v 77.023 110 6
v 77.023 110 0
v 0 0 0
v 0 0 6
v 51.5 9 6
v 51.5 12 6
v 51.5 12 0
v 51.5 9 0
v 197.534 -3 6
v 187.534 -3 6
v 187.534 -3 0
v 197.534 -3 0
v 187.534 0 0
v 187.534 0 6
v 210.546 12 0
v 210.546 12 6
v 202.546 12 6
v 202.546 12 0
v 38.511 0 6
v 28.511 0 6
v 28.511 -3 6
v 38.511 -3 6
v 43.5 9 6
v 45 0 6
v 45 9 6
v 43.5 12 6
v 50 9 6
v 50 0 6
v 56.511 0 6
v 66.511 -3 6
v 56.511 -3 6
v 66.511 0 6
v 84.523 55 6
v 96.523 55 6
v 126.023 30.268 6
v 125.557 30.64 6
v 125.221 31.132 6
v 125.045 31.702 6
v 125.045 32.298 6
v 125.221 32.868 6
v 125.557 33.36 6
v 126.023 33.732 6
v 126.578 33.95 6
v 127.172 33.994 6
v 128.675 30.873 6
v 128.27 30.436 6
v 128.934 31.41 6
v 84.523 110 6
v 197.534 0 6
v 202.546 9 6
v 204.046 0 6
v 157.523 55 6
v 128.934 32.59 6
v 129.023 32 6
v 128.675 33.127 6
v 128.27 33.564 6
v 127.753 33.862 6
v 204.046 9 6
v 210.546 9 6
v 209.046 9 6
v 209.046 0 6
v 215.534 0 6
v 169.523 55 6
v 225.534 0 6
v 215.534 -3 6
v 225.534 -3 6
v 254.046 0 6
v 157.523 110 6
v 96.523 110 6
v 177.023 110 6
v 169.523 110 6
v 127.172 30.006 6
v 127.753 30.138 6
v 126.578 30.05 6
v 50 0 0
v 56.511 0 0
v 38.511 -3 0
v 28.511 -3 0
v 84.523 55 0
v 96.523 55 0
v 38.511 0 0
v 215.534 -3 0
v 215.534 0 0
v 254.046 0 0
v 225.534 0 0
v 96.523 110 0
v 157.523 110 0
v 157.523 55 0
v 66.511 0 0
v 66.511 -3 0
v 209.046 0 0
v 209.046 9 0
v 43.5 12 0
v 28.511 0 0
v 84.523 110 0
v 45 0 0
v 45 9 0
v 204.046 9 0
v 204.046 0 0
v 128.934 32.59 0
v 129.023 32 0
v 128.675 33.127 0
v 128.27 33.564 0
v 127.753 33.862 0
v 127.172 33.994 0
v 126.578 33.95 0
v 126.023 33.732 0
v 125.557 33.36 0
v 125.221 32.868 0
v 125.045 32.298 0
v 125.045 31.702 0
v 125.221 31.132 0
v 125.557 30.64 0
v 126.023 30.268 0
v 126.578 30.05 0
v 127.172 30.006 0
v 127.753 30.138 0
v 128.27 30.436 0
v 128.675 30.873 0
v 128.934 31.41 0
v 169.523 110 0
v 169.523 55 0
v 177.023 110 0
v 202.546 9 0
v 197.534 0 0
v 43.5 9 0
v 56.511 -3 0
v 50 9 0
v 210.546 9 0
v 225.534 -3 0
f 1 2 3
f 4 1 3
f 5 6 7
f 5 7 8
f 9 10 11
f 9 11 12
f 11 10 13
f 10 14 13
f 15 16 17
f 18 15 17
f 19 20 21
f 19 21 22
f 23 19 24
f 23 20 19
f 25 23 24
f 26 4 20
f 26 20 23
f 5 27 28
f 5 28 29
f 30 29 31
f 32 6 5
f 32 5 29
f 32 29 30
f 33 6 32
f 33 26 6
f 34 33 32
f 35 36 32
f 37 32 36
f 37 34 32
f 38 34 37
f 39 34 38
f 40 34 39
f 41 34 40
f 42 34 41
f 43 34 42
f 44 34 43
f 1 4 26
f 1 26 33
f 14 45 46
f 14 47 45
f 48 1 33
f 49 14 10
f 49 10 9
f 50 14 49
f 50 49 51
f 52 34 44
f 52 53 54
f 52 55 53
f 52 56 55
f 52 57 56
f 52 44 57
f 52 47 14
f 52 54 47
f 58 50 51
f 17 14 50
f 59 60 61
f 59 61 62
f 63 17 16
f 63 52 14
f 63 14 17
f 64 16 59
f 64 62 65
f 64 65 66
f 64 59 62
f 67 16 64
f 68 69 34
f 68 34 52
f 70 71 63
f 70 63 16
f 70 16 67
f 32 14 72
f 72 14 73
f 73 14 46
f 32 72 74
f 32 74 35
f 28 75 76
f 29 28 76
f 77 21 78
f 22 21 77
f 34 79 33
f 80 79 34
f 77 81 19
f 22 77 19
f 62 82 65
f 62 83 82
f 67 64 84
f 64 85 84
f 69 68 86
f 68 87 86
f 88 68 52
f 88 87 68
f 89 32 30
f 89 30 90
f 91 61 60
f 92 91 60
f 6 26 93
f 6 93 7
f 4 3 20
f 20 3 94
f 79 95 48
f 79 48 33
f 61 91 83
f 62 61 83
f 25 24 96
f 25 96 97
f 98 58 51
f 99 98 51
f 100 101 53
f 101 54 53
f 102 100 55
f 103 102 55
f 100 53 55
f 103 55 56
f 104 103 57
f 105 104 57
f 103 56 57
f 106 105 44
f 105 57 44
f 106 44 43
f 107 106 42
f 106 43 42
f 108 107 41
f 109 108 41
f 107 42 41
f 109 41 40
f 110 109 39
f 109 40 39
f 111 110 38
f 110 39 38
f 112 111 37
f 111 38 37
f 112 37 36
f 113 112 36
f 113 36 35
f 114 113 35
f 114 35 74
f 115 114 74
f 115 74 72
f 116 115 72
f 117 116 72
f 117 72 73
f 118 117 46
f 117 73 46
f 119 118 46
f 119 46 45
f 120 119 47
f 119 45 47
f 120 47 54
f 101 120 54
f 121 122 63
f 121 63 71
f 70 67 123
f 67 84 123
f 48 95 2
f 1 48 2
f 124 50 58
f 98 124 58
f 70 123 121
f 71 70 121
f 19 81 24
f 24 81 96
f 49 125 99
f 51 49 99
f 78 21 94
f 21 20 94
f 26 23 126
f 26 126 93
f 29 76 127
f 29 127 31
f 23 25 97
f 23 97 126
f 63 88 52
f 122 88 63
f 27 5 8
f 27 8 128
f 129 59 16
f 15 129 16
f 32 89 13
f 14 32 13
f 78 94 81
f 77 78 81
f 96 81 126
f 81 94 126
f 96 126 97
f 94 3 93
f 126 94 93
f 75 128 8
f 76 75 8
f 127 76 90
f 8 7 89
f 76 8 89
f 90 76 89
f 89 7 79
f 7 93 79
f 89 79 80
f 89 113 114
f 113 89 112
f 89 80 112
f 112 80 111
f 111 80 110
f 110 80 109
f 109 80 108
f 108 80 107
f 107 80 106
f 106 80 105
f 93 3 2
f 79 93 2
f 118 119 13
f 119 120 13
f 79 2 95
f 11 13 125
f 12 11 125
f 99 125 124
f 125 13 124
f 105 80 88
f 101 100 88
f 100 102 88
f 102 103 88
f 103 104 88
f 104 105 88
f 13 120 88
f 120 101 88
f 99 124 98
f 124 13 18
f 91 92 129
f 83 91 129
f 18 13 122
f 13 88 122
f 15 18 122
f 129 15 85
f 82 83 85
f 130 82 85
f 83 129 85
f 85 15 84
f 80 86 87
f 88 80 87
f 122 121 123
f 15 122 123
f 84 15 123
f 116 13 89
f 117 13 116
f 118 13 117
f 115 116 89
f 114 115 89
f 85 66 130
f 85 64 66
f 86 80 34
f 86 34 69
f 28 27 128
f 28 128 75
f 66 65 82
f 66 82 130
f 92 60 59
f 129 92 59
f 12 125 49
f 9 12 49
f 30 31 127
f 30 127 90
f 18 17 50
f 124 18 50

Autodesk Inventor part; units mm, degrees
ref_plane "YZ Plane" through (0, 0, 0) normal (1, 0, 0) x (0, 1, 0)
ref_plane "XZ Plane" through (0, 0, 0) normal (0, 1, 0) x (-1, 0, 0)
ref_plane "XY Plane" through (0, 0, 0) normal (0, 0, 1) x (1, 0, 0)
sketch "Boceto1" plane through (0, 0, 0) normal (0, 0, 1) x (1, 0, 0)
  line L0 (254.0457, 0) -> (177.0228, 110)
  line L1 (77.0228, 110) -> (0, 0)
  line L2 (84.5228, 110) -> (84.5228, 55)
  line L3 (84.5228, 55) -> (96.5228, 55)
  line L4 (96.5228, 55) -> (96.5228, 110)
  line L5 (157.5228, 110) -> (157.5228, 55)
  line L6 (157.5228, 55) -> (169.5228, 55)
  line L7 (169.5228, 55) -> (169.5228, 110)
  line L8 (84.5228, 110) -> (77.0228, 110)
  line L9 (177.0228, 110) -> (169.5228, 110)
  line L10 (157.5228, 110) -> (96.5228, 110)
  line L11 (0, 0) -> (40.0401, 0)
  line L12 (40.0401, 0) -> (254.0457, 0)
  dimension "d1" = 100
  dimension "d2" = 110
  dimension "d3" = 61
  dimension "d5" = 12
  dimension "d6" = 7.5
  dimension "d12" = 55
  dimension "d23" = 55
  dimension "d24" = 55
extrude "Extrusión1" add sketch "Boceto1" along normal blind 6
sketch "Boceto3" plane through (0, 0, 6) normal (0, 0, 1) x (1, 0, 0)
  line L0 (0, 0) -> (254.0457, 0) projected
  line L1 (50, 9) -> (50, 0)
  line L2 (45, 0) -> (45, 9)
  line L3 (43.5, 12) -> (51.5, 12)
  line L4 (51.5, 12) -> (51.5, 9)
  line L5 (43.5, 9) -> (43.5, 12)
  line L6 (51.5, 9) -> (50, 9)
  line L7 (45, 9) -> (43.5, 9)
  line L8 (157.5228, 110) -> (96.5228, 110) projected
  line L9 (127.0228, 110) -> (127.0228, 0)
  line L10 (204.0457, 9) -> (204.0457, 0)
  line L11 (209.0457, 0) -> (209.0457, 9)
  line L12 (210.5457, 12) -> (202.5457, 12)
  line L13 (202.5457, 12) -> (202.5457, 9)
  line L14 (210.5457, 9) -> (210.5457, 12)
  line L15 (202.5457, 9) -> (204.0457, 9)
  line L16 (209.0457, 9) -> (210.5457, 9)
  line L17 (45, 0) -> (50, 0) construction
  line L18 (204.0457, 0) -> (209.0457, 0) construction
  point P0 (204.0457, 0)
  point P1 (47.5, 12)
  point P2 (47.5, 0)
  point P3 (206.5457, 0)
  dimension "d25" = 5
  dimension "d26" = 8
  dimension "d27" = 12
  dimension "d29" = 45
  dimension "d30" = 3
extrude "Extrusión3" cut sketch "Boceto3" against normal up to next
sketch "Boceto4" plane through (0, 0, 0) normal (0, -1, 0) x (1, 0, 0)
  line L0 (77.0228, 6) -> (0, 6) projected
  line L1 (77.0228, 0) -> (0, 0) projected
  line L2 (38.5114, 6) -> (28.5114, 6)
  line L3 (28.5114, 6) -> (28.5114, 0)
  line L4 (28.5114, 0) -> (38.5114, 0)
  line L5 (38.5114, 0) -> (38.5114, 6)
  line L6 (50, 0) -> (204.0457, 0) projected
  line L7 (56.5114, 6) -> (66.5114, 6)
  line L8 (66.5114, 6) -> (66.5114, 0)
  line L9 (66.5114, 0) -> (56.5114, 0)
  line L10 (56.5114, 0) -> (56.5114, 6)
  line L11 (157.5228, 0) -> (96.5228, 0) projected
  line L12 (127.0228, 0) -> (127.0228, 6) construction
  line L13 (215.5342, 6) -> (225.5342, 6)
  line L14 (225.5342, 6) -> (225.5342, 0)
  line L15 (225.5342, 0) -> (215.5342, 0)
  line L16 (215.5342, 0) -> (215.5342, 6)
  line L17 (197.5342, 6) -> (187.5342, 6)
  line L18 (187.5342, 6) -> (187.5342, 0)
  line L19 (187.5342, 0) -> (197.5342, 0)
  line L20 (197.5342, 0) -> (197.5342, 6)
  dimension "d33" = 10
  dimension "d34" = 18
  dimension "d35" = 10
extrude "Extrusión4" add sketch "Boceto4" along normal blind 3 contours L8 L1 L10 L0 | L18 L17 L20 L6 | L5 L1 L3 L0 | L13 L14 L15 L16
sketch "Boceto5" plane through (0, 0, 6) normal (0, 0, 1) x (1, 0, 0)
  circle A0 centre (127.0228, 32) radius 2
  line L0 (66.5114, 0) -> (187.5342, 0) projected
  line L1 (157.5228, 110) -> (96.5228, 110) projected
  point P0 (0, 0)
  point P1 (127.0228, 110)
  dimension "d39" = 4
  dimension "d40" = 32
extrude "Extrusión5" cut sketch "Boceto5" against normal through all
properties part number "UnionColumnas"
